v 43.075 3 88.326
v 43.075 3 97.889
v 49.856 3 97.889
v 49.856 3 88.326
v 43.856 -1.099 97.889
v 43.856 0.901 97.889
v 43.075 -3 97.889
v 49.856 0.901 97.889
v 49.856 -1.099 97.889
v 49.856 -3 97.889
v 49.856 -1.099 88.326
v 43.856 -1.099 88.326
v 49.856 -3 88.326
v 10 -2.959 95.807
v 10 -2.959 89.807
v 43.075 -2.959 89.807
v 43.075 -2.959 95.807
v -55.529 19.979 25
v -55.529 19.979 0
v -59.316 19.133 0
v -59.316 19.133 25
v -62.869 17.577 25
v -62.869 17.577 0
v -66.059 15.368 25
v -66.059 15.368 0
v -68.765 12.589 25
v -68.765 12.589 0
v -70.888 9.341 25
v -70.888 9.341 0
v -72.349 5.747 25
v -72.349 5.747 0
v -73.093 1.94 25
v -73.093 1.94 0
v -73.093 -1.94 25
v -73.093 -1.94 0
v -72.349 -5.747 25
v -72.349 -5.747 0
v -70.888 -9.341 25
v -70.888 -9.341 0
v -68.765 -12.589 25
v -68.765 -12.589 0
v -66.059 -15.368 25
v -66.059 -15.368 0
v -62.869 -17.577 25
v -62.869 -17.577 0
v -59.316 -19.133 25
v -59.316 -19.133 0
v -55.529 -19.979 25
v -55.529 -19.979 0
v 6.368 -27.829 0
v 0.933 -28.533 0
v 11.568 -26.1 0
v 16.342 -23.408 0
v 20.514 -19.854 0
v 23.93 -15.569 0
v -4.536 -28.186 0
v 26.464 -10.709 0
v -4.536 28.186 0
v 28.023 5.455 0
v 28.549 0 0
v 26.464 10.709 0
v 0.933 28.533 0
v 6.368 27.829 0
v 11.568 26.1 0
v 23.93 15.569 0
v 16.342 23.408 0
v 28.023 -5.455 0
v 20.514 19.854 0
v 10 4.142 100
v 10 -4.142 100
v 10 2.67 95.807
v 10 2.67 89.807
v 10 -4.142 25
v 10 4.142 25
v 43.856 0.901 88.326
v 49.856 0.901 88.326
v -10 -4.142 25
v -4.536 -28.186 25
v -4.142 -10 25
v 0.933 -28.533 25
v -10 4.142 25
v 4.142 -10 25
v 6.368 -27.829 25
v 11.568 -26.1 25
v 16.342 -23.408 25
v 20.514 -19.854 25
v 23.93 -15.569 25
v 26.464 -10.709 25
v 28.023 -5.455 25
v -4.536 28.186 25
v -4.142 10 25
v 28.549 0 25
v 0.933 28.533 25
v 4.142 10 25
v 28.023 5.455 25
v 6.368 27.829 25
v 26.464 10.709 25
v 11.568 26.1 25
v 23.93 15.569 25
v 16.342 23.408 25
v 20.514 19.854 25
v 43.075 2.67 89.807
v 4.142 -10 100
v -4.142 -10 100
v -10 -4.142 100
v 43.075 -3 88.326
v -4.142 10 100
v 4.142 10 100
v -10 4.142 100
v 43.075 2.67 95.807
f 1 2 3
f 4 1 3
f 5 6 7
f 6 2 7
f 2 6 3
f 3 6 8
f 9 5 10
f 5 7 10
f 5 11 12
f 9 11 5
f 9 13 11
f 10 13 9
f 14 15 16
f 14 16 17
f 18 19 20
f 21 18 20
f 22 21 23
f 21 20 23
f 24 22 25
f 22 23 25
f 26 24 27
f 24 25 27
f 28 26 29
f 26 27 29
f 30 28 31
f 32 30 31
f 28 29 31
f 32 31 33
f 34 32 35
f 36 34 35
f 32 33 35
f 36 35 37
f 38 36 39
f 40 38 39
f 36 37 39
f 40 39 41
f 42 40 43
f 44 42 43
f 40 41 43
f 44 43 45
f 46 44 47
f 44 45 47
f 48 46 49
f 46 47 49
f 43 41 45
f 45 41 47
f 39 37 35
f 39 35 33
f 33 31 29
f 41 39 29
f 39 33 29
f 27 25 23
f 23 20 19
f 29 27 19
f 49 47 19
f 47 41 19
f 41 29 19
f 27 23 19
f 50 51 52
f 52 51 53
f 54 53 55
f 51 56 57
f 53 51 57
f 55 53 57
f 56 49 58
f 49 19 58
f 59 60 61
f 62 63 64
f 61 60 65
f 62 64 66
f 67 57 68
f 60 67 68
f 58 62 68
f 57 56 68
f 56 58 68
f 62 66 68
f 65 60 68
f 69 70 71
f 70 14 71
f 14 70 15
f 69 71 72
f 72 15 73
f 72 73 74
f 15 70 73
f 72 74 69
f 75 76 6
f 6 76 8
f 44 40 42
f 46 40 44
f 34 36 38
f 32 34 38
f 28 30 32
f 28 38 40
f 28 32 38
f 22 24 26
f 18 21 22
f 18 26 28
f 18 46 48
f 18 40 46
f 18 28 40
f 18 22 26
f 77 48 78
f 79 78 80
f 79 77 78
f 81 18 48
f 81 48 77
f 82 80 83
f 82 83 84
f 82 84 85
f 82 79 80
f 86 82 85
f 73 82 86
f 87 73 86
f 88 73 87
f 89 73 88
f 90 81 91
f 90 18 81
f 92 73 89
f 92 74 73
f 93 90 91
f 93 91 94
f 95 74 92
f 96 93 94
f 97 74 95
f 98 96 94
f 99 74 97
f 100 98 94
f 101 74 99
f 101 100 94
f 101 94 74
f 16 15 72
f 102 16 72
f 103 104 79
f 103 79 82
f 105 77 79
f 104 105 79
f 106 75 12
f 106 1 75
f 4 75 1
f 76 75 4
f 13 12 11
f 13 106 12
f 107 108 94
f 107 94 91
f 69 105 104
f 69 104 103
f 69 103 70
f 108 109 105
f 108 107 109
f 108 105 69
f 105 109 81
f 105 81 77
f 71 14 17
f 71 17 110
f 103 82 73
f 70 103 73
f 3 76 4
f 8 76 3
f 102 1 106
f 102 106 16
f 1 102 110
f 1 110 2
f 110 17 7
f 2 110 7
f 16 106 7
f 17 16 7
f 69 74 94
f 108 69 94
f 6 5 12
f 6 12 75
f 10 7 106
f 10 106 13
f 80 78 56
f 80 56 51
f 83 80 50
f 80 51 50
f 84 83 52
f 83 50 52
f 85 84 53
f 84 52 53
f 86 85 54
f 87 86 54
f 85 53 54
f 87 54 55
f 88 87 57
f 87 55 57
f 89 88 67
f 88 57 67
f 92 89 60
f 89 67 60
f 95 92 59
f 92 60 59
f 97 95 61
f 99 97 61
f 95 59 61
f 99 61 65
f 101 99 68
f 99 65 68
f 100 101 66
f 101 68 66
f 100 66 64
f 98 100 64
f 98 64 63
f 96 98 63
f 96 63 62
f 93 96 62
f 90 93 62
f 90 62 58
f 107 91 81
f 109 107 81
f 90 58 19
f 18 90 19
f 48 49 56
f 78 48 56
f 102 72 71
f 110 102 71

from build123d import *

# Parameters (mm, degrees)
F1_DEPTH = 25
F3_DEPTH = 75
F4_W     = 5.629124
F4_H     = 6
F5_DEPTH = 35
F6_W     = 6.780945
F6_H     = 9.562873
F7_DEPTH = 3
F8_W     = 2
F8_H     = 9.562873
F9_DEPTH = 6


with BuildPart() as f1:
    # F0 (on Top) → F1 (new body)
    with BuildSketch(Plane.XY):
        with BuildLine():
            Line((-4.536292, 28.185949), (-55.529496, 19.979021))
            ThreePointArc((-55.529496, 19.979021), (-73.186468, 0), (-55.529496, -19.979021))
            Line((-55.529496, -19.979021), (-4.536292, -28.185949))
            ThreePointArc((-4.536292, -28.185949), (28.548654, 0), (-4.536292, 28.185949))
        make_face()
    extrude(amount=F1_DEPTH)

    # F2 (on face) → F3 (join)
    with BuildSketch(Plane.XY.offset(25)):
        Polygon((-10, 4.142136), (-10, -4.142136), (-4.142136, -10), (4.142136, -10), (10, -4.142136), (10, 4.142136), (4.142136, 10), (-4.142136, 10), align=None)
    extrude(amount=F3_DEPTH)

    # F4 (on face) → F5 (join)
    with BuildSketch(Plane.YZ.offset(10)):
        with Locations((-0.144606, 92.806667)):
            Rectangle(F4_W, F4_H)
    extrude(amount=F5_DEPTH)

    # F6 (on Front) → F7 (join, symmetric)
    with BuildSketch(Plane.XZ):
        with Locations((46.465266, 93.107711)):
            Rectangle(F6_W, F6_H)
    extrude(amount=F7_DEPTH, both=True)

    # F8 (on face) → F9 (cut)
    with BuildSketch(Plane.YZ.offset(49.855739)):
        with Locations((-0.098561, 93.107711)):
            Rectangle(F8_W, F8_H)
    extrude(amount=-F9_DEPTH, mode=Mode.SUBTRACT)


solid = f1.part
